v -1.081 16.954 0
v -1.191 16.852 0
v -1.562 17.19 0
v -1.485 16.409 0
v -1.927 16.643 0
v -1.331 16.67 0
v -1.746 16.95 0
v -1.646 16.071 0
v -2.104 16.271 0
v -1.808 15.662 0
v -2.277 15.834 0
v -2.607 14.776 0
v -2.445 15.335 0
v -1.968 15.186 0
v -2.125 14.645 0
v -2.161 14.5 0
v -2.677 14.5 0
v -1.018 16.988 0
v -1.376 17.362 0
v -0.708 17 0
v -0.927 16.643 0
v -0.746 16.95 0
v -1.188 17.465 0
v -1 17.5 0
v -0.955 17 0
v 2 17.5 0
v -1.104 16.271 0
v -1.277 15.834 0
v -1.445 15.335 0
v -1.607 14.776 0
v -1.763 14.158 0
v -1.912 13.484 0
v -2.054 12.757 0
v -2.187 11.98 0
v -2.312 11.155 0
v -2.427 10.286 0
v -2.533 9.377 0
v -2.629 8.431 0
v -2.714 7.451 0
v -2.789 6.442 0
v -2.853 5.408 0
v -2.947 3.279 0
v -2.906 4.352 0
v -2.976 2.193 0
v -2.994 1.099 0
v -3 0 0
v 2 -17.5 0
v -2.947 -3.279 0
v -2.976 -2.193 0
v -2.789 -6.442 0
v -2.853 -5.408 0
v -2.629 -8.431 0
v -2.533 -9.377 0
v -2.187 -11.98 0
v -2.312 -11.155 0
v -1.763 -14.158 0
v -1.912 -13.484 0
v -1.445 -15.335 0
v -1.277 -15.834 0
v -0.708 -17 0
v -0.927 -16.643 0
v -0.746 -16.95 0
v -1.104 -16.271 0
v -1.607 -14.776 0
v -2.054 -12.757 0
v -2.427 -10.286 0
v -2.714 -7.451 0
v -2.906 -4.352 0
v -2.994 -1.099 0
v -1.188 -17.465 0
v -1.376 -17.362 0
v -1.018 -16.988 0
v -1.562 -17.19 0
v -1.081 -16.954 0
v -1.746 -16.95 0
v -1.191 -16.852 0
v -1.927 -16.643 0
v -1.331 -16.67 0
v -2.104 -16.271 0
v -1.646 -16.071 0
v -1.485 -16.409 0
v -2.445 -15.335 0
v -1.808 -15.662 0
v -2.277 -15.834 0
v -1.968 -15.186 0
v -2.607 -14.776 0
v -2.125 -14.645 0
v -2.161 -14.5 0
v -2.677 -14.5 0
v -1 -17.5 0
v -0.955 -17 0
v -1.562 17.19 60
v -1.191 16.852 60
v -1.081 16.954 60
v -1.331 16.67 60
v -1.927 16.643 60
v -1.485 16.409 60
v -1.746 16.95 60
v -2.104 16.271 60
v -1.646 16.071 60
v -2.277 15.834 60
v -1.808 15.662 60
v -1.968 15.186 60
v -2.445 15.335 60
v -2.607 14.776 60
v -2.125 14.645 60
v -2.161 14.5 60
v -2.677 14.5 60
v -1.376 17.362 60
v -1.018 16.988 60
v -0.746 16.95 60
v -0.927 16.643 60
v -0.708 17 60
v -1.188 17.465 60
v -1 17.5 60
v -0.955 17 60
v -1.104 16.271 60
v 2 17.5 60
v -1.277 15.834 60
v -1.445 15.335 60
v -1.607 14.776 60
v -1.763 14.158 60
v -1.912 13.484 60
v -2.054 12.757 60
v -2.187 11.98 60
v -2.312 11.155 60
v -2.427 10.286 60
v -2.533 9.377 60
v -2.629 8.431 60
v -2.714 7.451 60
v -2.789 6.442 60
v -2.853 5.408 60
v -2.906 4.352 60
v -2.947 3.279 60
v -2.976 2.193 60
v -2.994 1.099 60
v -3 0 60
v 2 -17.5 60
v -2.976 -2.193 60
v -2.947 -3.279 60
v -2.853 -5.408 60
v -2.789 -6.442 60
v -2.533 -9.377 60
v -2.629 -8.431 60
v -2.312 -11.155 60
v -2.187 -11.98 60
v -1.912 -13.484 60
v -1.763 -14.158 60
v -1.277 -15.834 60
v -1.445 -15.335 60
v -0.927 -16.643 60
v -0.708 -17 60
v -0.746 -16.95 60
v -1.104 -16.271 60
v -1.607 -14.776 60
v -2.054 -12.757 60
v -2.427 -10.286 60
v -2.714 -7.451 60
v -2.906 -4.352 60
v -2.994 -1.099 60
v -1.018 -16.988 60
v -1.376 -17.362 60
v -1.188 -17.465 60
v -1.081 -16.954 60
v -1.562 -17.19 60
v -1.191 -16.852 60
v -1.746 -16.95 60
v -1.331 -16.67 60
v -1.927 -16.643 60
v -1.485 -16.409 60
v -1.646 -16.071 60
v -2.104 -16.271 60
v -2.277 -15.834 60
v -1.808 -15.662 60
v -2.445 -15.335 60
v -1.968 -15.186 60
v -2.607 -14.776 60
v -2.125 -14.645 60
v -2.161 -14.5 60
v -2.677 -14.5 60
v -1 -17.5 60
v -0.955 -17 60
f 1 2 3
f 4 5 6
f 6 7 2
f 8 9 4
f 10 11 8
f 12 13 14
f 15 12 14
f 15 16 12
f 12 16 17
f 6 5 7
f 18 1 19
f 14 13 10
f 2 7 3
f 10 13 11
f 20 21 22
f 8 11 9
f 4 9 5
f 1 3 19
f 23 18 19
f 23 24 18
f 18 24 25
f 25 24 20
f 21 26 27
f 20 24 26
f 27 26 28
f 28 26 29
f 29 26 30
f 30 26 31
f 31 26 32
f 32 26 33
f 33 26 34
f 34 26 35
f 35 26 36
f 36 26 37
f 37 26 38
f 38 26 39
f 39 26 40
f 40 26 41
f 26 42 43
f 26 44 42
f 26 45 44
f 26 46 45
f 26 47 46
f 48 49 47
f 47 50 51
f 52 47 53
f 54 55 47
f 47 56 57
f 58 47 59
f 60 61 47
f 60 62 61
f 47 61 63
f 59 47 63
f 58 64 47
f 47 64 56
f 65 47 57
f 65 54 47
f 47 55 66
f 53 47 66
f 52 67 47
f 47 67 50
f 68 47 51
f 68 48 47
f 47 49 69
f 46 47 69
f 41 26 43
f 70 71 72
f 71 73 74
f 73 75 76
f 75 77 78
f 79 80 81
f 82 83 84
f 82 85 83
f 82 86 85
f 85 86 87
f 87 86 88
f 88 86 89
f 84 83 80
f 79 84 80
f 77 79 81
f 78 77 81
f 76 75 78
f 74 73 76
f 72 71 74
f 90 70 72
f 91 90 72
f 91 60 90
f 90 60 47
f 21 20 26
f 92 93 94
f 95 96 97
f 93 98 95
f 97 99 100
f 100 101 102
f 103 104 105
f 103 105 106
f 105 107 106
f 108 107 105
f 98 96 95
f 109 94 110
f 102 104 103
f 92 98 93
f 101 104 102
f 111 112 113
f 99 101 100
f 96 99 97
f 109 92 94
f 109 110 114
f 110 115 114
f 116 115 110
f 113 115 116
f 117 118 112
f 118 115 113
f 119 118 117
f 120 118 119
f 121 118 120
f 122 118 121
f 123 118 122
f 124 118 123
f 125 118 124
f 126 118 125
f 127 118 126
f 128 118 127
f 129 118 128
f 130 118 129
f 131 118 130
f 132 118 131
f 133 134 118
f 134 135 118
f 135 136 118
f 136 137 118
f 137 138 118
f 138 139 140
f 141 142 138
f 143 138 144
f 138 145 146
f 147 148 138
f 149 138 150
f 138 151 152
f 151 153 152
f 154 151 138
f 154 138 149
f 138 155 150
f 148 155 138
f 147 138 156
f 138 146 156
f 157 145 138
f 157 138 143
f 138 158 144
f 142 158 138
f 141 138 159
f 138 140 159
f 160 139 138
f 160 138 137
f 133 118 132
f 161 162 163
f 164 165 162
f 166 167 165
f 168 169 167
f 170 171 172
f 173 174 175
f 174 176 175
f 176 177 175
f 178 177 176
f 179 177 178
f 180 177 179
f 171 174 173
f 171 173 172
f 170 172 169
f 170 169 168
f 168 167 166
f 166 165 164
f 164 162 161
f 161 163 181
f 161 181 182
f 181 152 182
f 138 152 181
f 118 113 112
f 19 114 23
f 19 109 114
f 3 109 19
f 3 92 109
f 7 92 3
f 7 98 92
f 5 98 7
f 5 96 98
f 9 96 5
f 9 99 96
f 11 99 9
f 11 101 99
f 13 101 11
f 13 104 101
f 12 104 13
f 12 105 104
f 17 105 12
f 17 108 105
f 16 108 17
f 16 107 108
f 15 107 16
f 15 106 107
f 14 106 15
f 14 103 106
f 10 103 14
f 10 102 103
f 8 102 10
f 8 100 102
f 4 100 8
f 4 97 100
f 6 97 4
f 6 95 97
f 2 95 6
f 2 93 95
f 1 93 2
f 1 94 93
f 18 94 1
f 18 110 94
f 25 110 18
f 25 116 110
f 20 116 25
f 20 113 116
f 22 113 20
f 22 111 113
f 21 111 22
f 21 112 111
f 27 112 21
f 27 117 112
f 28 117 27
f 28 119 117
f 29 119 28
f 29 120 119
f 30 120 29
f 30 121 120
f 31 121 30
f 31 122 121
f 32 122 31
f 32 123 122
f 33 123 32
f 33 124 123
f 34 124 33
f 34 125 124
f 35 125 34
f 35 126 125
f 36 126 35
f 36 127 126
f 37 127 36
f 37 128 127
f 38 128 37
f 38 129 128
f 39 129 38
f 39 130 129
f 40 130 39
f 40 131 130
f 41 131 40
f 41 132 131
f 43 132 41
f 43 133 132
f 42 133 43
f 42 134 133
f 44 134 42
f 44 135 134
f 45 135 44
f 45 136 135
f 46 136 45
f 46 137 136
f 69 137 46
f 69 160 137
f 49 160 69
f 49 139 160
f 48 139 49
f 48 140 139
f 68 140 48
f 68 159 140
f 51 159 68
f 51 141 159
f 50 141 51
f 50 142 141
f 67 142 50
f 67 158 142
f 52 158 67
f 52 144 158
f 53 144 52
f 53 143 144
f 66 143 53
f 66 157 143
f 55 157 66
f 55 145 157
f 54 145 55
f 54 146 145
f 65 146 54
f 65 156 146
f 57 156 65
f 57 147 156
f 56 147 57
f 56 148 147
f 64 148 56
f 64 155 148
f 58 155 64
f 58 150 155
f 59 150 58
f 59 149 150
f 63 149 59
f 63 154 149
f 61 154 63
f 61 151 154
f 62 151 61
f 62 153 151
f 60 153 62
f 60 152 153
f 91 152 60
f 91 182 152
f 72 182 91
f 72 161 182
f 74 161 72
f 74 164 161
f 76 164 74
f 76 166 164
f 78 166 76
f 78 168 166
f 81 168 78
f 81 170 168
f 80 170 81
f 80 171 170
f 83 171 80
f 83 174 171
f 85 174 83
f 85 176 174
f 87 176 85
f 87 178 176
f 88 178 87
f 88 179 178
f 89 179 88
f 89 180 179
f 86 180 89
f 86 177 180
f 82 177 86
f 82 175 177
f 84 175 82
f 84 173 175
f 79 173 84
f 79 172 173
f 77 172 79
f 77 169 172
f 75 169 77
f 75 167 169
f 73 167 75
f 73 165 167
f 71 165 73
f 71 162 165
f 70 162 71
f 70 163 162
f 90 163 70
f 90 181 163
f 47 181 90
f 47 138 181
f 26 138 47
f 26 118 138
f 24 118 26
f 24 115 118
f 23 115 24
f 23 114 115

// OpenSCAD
LABEL_HOLDER_WIDTH = 60;
LABEL_HOLDER_HEIGHT = 35;
LABEL_HOLDER_THICKNESS = 2;
LABEL_HOLDER_ROUND_SIZE= 3;

LABEL_THICKNESS = 0.5;
LABEL_CLIP_THICKNESS = 0.5;

LABEL_CLIP_LENGTH= 3;

$fn = 100;




module label_holder_base() {
    difference() {
    resize([LABEL_HOLDER_ROUND_SIZE*2, LABEL_HOLDER_HEIGHT]) circle(d = 10);

    translate([0, -LABEL_HOLDER_HEIGHT/2]) square([LABEL_HOLDER_ROUND_SIZE, LABEL_HOLDER_HEIGHT]);
    }

    translate([0, -LABEL_HOLDER_HEIGHT/2]) square([LABEL_HOLDER_THICKNESS, LABEL_HOLDER_HEIGHT]);
}

module label_holder() {
    translate([-LABEL_THICKNESS - LABEL_CLIP_THICKNESS, 0])
    difference() {
    label_holder_base() ;
    offset(delta = -LABEL_CLIP_THICKNESS) label_holder_base() ;
       square([100, LABEL_HOLDER_HEIGHT - LABEL_CLIP_LENGTH * 2], center = true);
    }
    color("green") label_holder_base() ;
}

linear_extrude(height = LABEL_HOLDER_WIDTH) label_holder();
